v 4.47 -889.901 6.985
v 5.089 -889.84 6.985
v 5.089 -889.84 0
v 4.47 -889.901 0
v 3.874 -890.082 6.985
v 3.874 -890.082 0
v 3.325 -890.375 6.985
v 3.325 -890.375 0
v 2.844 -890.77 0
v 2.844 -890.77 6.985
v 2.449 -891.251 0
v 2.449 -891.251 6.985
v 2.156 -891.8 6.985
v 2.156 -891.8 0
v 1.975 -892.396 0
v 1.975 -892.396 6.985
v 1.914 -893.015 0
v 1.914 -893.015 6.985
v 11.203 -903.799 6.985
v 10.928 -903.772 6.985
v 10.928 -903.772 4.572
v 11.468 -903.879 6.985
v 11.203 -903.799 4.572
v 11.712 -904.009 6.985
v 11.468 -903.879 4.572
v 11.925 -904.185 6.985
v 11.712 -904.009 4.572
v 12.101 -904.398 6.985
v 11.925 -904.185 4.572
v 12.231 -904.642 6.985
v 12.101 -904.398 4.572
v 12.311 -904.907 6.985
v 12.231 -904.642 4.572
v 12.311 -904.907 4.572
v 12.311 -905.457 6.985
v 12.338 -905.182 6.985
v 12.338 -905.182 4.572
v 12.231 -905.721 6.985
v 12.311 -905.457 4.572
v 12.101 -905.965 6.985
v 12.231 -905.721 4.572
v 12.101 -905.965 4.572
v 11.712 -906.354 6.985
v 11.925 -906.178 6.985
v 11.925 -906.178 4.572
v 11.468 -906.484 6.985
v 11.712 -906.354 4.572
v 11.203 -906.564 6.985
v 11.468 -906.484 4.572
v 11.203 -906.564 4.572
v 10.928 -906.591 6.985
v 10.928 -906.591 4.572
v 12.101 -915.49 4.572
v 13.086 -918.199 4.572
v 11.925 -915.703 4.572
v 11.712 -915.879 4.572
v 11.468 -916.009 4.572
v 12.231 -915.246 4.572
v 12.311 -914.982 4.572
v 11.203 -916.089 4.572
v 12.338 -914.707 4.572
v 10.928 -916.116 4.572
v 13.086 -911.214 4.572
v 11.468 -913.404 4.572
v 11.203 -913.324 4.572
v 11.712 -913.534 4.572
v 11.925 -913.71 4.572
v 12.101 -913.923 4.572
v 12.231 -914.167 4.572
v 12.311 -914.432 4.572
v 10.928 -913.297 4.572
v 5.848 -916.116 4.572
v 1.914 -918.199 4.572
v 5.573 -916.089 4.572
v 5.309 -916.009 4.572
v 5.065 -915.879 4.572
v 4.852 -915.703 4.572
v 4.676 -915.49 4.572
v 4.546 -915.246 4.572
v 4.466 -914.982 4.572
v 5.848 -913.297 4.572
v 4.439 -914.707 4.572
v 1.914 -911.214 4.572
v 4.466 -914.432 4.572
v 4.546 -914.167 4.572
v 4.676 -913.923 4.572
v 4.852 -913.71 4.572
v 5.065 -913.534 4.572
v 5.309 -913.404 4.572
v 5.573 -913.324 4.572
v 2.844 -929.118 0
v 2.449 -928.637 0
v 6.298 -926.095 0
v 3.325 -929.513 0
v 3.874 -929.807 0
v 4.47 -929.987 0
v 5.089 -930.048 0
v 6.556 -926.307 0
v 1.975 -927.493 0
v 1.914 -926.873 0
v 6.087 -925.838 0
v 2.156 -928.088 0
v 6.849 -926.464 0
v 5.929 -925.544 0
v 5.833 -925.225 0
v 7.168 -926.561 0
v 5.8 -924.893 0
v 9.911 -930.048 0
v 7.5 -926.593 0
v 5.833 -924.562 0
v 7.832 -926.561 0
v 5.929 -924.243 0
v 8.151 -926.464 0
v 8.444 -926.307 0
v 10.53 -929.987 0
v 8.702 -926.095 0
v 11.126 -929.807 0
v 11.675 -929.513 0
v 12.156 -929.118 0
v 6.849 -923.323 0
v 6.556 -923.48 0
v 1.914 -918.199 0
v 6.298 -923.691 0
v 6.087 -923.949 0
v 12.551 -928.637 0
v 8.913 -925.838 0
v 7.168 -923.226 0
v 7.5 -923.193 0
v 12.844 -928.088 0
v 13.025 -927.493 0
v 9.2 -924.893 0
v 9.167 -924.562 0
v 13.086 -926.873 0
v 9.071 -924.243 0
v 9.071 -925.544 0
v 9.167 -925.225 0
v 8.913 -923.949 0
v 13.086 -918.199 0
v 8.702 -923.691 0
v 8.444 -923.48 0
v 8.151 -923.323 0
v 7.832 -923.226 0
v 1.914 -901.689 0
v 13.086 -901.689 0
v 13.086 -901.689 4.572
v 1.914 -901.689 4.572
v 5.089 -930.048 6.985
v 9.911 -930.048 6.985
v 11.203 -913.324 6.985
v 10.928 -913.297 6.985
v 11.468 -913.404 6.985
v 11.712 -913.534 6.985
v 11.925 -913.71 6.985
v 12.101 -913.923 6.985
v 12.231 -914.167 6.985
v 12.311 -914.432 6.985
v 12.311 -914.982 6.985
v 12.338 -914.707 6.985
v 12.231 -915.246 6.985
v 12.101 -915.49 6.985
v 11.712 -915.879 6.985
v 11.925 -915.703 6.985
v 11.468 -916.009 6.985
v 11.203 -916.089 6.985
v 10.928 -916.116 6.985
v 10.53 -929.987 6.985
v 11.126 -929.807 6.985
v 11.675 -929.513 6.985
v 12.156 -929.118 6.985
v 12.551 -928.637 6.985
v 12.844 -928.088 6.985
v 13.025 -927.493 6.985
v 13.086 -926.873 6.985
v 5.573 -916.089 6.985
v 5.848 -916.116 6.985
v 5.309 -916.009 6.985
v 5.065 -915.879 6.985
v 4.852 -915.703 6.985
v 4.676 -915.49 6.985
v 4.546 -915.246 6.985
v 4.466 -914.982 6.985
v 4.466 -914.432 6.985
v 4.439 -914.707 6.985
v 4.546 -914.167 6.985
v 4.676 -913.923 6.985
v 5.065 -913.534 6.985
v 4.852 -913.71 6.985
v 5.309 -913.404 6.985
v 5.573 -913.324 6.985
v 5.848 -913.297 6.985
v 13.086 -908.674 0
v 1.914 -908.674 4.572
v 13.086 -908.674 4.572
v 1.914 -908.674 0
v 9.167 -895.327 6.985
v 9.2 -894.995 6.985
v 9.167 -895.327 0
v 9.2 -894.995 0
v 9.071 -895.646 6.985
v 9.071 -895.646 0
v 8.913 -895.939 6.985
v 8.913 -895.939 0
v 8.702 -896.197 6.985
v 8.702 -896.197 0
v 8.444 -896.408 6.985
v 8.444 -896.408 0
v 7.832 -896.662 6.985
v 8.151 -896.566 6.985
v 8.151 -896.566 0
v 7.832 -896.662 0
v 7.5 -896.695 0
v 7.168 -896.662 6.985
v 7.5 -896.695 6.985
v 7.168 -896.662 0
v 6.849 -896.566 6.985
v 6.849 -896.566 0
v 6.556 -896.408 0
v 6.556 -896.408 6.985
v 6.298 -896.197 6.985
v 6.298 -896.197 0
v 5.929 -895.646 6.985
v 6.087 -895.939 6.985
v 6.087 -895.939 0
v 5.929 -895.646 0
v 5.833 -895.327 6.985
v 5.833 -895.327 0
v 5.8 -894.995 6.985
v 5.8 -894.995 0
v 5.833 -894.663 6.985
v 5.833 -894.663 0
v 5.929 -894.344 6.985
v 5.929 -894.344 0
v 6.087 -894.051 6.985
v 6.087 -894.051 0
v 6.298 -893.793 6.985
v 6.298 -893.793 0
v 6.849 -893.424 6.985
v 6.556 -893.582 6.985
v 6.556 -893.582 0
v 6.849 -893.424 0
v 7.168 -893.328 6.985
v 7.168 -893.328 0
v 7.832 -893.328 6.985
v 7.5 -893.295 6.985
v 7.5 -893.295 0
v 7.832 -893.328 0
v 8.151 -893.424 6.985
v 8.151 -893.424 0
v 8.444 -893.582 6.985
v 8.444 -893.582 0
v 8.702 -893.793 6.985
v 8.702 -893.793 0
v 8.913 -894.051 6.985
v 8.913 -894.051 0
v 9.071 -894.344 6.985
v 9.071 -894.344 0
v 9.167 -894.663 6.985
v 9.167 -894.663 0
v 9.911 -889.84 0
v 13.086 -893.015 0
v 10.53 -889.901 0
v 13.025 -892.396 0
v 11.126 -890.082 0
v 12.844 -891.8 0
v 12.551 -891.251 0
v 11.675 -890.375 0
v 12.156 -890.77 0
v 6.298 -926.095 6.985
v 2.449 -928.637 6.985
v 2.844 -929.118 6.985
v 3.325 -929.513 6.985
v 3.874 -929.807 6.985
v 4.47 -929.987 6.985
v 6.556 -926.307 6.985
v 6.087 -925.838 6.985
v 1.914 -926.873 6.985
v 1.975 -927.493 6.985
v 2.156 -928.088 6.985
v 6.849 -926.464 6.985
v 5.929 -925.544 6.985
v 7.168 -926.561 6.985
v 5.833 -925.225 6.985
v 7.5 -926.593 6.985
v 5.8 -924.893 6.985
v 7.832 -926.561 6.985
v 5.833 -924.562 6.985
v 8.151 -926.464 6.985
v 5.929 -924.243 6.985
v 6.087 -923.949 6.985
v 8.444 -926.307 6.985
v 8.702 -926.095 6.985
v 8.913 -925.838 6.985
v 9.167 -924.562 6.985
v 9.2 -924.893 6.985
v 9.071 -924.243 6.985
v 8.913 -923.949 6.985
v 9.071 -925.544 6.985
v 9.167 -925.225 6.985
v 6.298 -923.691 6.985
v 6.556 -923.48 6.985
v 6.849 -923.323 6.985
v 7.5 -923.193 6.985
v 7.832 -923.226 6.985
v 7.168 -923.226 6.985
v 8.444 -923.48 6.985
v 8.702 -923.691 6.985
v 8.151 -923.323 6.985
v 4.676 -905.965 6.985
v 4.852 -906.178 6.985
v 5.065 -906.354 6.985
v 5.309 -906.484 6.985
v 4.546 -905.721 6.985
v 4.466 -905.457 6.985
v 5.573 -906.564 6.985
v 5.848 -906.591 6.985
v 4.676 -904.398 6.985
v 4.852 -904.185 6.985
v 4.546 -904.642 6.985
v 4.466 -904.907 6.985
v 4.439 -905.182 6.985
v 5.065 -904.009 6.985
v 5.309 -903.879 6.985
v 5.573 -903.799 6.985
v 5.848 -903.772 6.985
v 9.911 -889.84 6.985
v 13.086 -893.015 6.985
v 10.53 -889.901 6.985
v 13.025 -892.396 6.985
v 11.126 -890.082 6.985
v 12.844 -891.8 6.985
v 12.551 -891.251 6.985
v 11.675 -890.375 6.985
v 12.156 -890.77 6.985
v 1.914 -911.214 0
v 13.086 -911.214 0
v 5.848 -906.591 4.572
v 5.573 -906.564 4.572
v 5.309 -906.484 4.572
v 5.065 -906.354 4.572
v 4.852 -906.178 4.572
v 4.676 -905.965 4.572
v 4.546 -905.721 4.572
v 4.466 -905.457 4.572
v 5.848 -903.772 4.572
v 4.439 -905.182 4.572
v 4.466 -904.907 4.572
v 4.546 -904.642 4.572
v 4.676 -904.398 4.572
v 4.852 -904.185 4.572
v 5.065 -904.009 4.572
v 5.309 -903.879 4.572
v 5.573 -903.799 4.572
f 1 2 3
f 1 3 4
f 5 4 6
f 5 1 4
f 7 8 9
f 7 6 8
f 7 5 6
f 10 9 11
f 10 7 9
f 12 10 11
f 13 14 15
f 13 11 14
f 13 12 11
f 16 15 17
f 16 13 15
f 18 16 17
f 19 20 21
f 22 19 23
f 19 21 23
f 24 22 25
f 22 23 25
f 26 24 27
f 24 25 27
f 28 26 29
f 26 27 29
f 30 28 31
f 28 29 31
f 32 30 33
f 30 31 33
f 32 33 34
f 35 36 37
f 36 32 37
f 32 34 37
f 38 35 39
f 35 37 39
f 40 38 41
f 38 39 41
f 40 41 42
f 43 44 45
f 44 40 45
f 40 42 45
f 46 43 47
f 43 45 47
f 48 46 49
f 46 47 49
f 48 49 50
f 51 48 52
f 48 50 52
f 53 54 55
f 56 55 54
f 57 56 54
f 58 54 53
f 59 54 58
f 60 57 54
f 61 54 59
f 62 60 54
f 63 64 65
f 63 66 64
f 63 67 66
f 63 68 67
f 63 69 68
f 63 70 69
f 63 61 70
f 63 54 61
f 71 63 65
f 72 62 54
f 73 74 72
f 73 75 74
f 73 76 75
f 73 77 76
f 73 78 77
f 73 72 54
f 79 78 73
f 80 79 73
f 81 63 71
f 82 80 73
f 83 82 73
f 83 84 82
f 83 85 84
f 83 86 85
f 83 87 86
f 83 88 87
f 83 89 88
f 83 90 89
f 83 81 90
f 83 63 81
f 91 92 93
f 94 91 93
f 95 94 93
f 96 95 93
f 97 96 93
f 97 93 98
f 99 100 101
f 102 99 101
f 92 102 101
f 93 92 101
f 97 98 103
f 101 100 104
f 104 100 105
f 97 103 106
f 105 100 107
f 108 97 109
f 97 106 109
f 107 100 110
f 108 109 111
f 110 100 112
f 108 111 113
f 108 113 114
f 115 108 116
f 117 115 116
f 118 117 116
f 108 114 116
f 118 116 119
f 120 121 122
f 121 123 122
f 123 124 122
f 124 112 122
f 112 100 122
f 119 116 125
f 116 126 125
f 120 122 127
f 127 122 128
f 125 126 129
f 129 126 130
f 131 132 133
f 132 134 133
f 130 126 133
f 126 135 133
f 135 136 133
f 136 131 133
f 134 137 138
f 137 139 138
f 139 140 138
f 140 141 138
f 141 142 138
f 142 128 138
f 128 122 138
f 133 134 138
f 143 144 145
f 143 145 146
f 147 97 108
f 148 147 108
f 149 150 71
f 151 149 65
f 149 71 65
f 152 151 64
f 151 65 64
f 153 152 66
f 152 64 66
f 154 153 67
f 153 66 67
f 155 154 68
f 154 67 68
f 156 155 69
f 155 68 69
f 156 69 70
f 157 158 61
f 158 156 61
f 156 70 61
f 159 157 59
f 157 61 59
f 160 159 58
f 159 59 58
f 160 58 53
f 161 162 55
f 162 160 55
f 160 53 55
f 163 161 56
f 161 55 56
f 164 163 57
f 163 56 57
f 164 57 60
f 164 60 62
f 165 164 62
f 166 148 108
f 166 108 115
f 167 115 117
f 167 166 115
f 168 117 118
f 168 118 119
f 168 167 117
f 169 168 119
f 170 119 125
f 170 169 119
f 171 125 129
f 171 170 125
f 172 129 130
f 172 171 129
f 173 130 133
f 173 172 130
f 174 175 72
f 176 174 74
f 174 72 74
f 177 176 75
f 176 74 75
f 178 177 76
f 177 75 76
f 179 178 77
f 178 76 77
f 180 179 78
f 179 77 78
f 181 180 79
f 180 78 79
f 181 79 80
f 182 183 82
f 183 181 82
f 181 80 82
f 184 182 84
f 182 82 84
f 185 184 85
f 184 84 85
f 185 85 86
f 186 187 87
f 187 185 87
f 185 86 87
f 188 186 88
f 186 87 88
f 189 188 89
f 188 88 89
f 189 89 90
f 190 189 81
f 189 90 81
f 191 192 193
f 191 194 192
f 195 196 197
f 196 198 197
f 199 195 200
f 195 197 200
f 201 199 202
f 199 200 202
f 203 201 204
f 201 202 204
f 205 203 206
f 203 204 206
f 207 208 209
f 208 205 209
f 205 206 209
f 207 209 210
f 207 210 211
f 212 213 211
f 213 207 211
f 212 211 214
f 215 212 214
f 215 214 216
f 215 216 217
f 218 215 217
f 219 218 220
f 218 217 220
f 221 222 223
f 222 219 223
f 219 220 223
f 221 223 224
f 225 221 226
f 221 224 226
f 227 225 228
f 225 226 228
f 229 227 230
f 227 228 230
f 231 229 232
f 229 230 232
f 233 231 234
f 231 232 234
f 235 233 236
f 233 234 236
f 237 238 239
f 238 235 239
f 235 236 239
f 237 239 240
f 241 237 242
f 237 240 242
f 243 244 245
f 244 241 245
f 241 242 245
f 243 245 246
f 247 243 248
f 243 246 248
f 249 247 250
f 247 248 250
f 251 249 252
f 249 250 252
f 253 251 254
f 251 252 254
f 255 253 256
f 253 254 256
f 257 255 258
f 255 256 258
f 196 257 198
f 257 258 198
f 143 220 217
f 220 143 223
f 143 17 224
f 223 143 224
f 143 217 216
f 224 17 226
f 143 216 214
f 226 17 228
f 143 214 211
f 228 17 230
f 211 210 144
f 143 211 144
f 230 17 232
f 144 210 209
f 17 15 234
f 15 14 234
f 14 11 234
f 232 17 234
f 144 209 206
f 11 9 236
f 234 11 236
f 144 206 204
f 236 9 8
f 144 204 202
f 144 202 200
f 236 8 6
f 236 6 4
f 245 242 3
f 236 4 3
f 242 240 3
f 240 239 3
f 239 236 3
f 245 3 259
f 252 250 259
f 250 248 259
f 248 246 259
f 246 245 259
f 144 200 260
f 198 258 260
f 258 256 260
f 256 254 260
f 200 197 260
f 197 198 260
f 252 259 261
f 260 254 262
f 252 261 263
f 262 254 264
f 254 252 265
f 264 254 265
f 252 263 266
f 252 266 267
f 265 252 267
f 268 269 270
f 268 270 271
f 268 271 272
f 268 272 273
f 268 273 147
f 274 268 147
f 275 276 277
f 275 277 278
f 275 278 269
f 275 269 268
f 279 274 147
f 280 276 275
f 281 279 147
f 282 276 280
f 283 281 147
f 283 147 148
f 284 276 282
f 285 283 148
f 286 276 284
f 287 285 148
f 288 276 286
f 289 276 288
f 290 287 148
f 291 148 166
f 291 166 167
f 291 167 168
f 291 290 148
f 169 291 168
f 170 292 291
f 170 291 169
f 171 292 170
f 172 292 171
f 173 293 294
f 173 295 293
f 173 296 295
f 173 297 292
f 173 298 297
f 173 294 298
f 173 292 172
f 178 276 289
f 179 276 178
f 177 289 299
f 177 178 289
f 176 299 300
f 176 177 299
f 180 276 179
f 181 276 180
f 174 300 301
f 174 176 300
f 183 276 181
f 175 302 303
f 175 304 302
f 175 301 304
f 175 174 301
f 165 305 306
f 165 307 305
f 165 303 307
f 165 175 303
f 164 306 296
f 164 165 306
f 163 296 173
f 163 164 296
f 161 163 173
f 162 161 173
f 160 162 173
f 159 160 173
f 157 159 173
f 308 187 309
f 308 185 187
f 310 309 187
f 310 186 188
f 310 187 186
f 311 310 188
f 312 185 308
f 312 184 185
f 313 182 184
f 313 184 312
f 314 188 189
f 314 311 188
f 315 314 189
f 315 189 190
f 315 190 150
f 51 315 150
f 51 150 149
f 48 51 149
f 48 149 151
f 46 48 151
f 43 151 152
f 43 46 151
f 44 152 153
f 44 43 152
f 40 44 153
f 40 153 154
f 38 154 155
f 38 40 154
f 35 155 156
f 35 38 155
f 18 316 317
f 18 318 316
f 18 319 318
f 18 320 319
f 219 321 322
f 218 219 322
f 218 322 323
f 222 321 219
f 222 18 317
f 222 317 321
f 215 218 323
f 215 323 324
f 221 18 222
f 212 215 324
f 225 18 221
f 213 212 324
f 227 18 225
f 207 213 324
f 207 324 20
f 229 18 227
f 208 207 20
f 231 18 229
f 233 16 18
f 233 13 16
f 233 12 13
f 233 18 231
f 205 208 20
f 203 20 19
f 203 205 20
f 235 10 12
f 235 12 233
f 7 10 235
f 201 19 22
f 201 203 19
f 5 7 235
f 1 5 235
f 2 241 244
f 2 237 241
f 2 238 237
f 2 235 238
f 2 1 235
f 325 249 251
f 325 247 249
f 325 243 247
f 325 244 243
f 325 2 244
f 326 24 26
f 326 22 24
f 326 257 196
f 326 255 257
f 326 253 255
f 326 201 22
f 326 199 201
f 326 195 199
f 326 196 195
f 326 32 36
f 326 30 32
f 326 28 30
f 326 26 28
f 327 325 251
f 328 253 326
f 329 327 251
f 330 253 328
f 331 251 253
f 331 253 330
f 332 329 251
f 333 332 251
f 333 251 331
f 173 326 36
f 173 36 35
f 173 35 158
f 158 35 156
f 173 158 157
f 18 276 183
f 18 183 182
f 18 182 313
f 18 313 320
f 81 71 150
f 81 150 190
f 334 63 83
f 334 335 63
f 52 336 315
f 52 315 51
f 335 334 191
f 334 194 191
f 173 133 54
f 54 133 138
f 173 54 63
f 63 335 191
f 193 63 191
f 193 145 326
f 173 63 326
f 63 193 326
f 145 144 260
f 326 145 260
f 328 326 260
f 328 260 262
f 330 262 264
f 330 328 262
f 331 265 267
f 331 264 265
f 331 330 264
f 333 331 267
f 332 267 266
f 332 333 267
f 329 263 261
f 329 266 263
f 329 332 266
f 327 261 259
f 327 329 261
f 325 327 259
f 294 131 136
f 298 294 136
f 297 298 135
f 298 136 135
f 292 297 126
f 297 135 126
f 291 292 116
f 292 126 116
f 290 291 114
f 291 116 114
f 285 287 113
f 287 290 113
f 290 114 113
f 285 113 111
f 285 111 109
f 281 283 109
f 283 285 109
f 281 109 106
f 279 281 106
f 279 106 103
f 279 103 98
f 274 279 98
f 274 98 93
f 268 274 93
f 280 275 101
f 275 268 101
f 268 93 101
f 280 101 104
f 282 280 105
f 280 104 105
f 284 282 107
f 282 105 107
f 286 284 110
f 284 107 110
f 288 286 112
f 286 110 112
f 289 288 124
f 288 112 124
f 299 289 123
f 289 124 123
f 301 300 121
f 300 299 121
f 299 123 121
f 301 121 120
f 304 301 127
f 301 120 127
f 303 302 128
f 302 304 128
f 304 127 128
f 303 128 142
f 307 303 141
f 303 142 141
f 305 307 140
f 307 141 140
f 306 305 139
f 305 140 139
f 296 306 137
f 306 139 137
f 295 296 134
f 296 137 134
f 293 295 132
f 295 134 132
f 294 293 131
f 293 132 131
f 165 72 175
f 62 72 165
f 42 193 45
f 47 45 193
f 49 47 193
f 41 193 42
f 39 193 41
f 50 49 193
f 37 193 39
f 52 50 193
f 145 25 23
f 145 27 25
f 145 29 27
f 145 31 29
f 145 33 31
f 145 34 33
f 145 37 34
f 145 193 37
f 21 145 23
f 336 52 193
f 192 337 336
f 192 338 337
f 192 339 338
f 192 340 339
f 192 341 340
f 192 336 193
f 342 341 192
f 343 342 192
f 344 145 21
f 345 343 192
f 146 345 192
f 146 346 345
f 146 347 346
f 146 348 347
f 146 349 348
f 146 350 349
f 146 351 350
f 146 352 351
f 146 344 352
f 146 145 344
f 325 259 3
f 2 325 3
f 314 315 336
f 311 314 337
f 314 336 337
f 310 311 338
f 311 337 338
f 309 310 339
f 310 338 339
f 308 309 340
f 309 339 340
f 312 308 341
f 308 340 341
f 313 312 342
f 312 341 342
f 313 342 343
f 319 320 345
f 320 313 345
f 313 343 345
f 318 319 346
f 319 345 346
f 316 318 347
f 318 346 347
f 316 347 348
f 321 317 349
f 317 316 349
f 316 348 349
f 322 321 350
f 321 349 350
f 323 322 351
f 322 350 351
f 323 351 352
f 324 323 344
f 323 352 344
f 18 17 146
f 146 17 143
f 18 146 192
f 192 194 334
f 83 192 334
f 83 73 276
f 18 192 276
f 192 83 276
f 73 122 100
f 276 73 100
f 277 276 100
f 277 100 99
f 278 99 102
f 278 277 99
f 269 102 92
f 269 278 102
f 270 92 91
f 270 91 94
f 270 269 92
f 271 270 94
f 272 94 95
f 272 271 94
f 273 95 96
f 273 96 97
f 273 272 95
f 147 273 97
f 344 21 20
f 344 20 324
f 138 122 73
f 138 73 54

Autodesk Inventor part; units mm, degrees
ref_plane "YZ Plane" through (0, 0, 0) normal (1, 0, 0) x (0, 1, 0)
ref_plane "XZ Plane" through (0, 0, 0) normal (0, 1, 0) x (-1, 0, 0)
ref_plane "Work Plane1" through (0, 0, 0) normal (0, 0, 1) x (1, 0, 0)
ref_plane "Work Plane2" through (0, 0, 0) normal (0, 0, 1) x (1, 0, 0)
sketch "Sketch2" plane through (0, 0, 0) normal (0, 0, 1) x (1, 0, 0)
  line L0 (1.9142, -654.4) -> (1.9142, -1000) construction
  line L1 (13.0858, -1000) -> (13.0858, -654.4) construction
  line L2 (10.8204, -900) -> (1.905, -900) construction
  line L3 (1.1684, -919.8882) -> (10.8204, -919.8882) construction
  circle A0 centre (8.3884, -914.7066) radius 1.1938 construction
  circle A1 centre (8.3884, -905.1816) radius 1.1938 construction
  line L4 (1.9142, -930.0482) -> (13.0858, -930.0482)
  line L5 (13.0858, -930.0482) -> (13.0858, -889.84)
  line L6 (13.0858, -889.84) -> (1.9142, -889.84)
  line L7 (1.9142, -889.84) -> (1.9142, -930.0482)
  circle A2 centre (7.5, -924.8932) radius 1.7
  circle A3 centre (7.5, -894.995) radius 1.7
  circle A4 centre (5.8484, -914.7066) radius 1.4097 construction
  circle A5 centre (5.8484, -914.7066) radius 3.4925 construction
  circle A6 centre (10.9284, -914.7066) radius 1.4097 construction
  circle A7 centre (10.9284, -914.7066) radius 3.4925 construction
  line L8 (5.8484, -914.7066) -> (10.9284, -914.7066) construction
  line L9 (5.8484, -916.1163) -> (10.9284, -916.1163)
  line L10 (10.9284, -913.2969) -> (5.8484, -913.2969)
  arc A8 (5.8484, -913.2969) -> (5.8484, -916.1163) centre (5.8484, -914.7066) ccw
  arc A9 (10.9284, -916.1163) -> (10.9284, -913.2969) centre (10.9284, -914.7066) ccw
  circle A10 centre (10.9284, -905.1816) radius 1.4097 construction
  circle A11 centre (10.9284, -905.1816) radius 3.4925 construction
  line L11 (5.8484, -906.5913) -> (10.9284, -906.5913)
  line L12 (10.9284, -903.7719) -> (5.8484, -903.7719)
  arc A12 (5.8484, -903.7719) -> (5.8484, -906.5913) centre (5.8484, -905.1816) ccw
  arc A13 (10.9284, -906.5913) -> (10.9284, -903.7719) centre (10.9284, -905.1816) ccw
  point P0 (0, 0)
  dimension "d0" = 10.16
  dimension "d1" = 10.16
  dimension "d4" = 3.4
  dimension "d5" = 3.4
  dimension "d6" = 5.155
  dimension "d7" = 5.155
  dimension "d8" = 2.8194
  dimension "d9" = 2.54
  dimension "d10" = 6.985
  dimension "d11" = 2.8194
  dimension "d12" = 6.985
  dimension "d13" = 2.54
  dimension "d14" = 2.8194
  dimension "d15" = 2.8194
  dimension "d16" = 6.985
  dimension "d17" = 2.8194
ref_plane "Work Plane3" through (6.6548, -916.4402, 6.985) normal (0, 0, -1) x (0, 1, 0)
extrude "Extrusion1" add sketch "Sketch2" along normal up to surface (6.985 mm away)
sketch "Sketch3" plane through (0, 0, 0) normal (0, 0, -1) x (-1, 0, 0)
  arc A0 (-5.8484, -906.5913) -> (-5.8484, -903.7719) centre (-5.8484, -905.1816) ccw construction
  arc A1 (-10.9284, -903.7719) -> (-10.9284, -906.5913) centre (-10.9284, -905.1816) ccw construction
  line L0 (-5.8484, -905.1816) -> (-10.9284, -905.1816) construction
  line L1 (-10.9284, -906.5913) -> (-5.8484, -906.5913) construction
  line L2 (-8.3884, -906.5913) -> (-8.3884, -903.7719) construction
  line L3 (-5.8484, -913.2969) -> (-10.9284, -913.2969) construction
  line L4 (-8.3884, -913.2969) -> (-8.3884, -916.1163) construction
  line L5 (-10.9284, -916.1163) -> (-5.8484, -916.1163) construction
  arc A2 (-5.8484, -916.1163) -> (-5.8484, -913.2969) centre (-5.8484, -914.7066) ccw construction
  arc A3 (-10.9284, -913.2969) -> (-10.9284, -916.1163) centre (-10.9284, -914.7066) ccw construction
  line L6 (-5.8484, -914.7066) -> (-10.9284, -914.7066) construction
  line L7 (-13.0858, -930.0482) -> (-13.0858, -889.84) projected
  line L8 (-1.9142, -908.6741) -> (-13.0858, -908.6741)
  line L9 (-13.0858, -908.6741) -> (-13.0858, -901.6891)
  line L10 (-13.0858, -901.6891) -> (-1.9142, -901.6891)
  line L11 (-3.6909, -908.6741) -> (-13.0858, -901.6891) construction
  line L12 (-13.0858, -908.6741) -> (-3.6909, -901.6891) construction
  line L13 (-1.9142, -889.84) -> (-1.9142, -930.0482) construction
  line L14 (-1.9142, -901.6891) -> (-1.9142, -908.6741)
  line L15 (-1.9142, -889.84) -> (-1.9142, -930.0482) projected
  line L16 (-1.9142, -918.1991) -> (-13.0858, -918.1991)
  line L17 (-13.0858, -918.1991) -> (-13.0858, -911.2141)
  line L18 (-13.0858, -911.2141) -> (-1.9142, -911.2141)
  line L19 (-1.9142, -911.2141) -> (-1.9142, -918.1991)
  point P0 (0, 0)
  point P1 (-8.3884, -905.1816)
  dimension "d20" = 6.985
  dimension "d21" = 6.985
extrude "Nut Well" cut sketch "Sketch3" against normal blind 4.572 contours L7 L18 L15 L16 | L7 L10 L14 L8
fillet "Fillet1" radius 3.175 4 edges at (13.0858, -889.84, 3.4925) (13.0858, -930.0482, 3.4925) (1.9142, -930.0482, 3.4925) (1.9142, -889.84, 3.4925)
equation "\"d1\" = d0"
equation "\"d7\" = d6"
properties part number "Limit swtich mount bottom"
